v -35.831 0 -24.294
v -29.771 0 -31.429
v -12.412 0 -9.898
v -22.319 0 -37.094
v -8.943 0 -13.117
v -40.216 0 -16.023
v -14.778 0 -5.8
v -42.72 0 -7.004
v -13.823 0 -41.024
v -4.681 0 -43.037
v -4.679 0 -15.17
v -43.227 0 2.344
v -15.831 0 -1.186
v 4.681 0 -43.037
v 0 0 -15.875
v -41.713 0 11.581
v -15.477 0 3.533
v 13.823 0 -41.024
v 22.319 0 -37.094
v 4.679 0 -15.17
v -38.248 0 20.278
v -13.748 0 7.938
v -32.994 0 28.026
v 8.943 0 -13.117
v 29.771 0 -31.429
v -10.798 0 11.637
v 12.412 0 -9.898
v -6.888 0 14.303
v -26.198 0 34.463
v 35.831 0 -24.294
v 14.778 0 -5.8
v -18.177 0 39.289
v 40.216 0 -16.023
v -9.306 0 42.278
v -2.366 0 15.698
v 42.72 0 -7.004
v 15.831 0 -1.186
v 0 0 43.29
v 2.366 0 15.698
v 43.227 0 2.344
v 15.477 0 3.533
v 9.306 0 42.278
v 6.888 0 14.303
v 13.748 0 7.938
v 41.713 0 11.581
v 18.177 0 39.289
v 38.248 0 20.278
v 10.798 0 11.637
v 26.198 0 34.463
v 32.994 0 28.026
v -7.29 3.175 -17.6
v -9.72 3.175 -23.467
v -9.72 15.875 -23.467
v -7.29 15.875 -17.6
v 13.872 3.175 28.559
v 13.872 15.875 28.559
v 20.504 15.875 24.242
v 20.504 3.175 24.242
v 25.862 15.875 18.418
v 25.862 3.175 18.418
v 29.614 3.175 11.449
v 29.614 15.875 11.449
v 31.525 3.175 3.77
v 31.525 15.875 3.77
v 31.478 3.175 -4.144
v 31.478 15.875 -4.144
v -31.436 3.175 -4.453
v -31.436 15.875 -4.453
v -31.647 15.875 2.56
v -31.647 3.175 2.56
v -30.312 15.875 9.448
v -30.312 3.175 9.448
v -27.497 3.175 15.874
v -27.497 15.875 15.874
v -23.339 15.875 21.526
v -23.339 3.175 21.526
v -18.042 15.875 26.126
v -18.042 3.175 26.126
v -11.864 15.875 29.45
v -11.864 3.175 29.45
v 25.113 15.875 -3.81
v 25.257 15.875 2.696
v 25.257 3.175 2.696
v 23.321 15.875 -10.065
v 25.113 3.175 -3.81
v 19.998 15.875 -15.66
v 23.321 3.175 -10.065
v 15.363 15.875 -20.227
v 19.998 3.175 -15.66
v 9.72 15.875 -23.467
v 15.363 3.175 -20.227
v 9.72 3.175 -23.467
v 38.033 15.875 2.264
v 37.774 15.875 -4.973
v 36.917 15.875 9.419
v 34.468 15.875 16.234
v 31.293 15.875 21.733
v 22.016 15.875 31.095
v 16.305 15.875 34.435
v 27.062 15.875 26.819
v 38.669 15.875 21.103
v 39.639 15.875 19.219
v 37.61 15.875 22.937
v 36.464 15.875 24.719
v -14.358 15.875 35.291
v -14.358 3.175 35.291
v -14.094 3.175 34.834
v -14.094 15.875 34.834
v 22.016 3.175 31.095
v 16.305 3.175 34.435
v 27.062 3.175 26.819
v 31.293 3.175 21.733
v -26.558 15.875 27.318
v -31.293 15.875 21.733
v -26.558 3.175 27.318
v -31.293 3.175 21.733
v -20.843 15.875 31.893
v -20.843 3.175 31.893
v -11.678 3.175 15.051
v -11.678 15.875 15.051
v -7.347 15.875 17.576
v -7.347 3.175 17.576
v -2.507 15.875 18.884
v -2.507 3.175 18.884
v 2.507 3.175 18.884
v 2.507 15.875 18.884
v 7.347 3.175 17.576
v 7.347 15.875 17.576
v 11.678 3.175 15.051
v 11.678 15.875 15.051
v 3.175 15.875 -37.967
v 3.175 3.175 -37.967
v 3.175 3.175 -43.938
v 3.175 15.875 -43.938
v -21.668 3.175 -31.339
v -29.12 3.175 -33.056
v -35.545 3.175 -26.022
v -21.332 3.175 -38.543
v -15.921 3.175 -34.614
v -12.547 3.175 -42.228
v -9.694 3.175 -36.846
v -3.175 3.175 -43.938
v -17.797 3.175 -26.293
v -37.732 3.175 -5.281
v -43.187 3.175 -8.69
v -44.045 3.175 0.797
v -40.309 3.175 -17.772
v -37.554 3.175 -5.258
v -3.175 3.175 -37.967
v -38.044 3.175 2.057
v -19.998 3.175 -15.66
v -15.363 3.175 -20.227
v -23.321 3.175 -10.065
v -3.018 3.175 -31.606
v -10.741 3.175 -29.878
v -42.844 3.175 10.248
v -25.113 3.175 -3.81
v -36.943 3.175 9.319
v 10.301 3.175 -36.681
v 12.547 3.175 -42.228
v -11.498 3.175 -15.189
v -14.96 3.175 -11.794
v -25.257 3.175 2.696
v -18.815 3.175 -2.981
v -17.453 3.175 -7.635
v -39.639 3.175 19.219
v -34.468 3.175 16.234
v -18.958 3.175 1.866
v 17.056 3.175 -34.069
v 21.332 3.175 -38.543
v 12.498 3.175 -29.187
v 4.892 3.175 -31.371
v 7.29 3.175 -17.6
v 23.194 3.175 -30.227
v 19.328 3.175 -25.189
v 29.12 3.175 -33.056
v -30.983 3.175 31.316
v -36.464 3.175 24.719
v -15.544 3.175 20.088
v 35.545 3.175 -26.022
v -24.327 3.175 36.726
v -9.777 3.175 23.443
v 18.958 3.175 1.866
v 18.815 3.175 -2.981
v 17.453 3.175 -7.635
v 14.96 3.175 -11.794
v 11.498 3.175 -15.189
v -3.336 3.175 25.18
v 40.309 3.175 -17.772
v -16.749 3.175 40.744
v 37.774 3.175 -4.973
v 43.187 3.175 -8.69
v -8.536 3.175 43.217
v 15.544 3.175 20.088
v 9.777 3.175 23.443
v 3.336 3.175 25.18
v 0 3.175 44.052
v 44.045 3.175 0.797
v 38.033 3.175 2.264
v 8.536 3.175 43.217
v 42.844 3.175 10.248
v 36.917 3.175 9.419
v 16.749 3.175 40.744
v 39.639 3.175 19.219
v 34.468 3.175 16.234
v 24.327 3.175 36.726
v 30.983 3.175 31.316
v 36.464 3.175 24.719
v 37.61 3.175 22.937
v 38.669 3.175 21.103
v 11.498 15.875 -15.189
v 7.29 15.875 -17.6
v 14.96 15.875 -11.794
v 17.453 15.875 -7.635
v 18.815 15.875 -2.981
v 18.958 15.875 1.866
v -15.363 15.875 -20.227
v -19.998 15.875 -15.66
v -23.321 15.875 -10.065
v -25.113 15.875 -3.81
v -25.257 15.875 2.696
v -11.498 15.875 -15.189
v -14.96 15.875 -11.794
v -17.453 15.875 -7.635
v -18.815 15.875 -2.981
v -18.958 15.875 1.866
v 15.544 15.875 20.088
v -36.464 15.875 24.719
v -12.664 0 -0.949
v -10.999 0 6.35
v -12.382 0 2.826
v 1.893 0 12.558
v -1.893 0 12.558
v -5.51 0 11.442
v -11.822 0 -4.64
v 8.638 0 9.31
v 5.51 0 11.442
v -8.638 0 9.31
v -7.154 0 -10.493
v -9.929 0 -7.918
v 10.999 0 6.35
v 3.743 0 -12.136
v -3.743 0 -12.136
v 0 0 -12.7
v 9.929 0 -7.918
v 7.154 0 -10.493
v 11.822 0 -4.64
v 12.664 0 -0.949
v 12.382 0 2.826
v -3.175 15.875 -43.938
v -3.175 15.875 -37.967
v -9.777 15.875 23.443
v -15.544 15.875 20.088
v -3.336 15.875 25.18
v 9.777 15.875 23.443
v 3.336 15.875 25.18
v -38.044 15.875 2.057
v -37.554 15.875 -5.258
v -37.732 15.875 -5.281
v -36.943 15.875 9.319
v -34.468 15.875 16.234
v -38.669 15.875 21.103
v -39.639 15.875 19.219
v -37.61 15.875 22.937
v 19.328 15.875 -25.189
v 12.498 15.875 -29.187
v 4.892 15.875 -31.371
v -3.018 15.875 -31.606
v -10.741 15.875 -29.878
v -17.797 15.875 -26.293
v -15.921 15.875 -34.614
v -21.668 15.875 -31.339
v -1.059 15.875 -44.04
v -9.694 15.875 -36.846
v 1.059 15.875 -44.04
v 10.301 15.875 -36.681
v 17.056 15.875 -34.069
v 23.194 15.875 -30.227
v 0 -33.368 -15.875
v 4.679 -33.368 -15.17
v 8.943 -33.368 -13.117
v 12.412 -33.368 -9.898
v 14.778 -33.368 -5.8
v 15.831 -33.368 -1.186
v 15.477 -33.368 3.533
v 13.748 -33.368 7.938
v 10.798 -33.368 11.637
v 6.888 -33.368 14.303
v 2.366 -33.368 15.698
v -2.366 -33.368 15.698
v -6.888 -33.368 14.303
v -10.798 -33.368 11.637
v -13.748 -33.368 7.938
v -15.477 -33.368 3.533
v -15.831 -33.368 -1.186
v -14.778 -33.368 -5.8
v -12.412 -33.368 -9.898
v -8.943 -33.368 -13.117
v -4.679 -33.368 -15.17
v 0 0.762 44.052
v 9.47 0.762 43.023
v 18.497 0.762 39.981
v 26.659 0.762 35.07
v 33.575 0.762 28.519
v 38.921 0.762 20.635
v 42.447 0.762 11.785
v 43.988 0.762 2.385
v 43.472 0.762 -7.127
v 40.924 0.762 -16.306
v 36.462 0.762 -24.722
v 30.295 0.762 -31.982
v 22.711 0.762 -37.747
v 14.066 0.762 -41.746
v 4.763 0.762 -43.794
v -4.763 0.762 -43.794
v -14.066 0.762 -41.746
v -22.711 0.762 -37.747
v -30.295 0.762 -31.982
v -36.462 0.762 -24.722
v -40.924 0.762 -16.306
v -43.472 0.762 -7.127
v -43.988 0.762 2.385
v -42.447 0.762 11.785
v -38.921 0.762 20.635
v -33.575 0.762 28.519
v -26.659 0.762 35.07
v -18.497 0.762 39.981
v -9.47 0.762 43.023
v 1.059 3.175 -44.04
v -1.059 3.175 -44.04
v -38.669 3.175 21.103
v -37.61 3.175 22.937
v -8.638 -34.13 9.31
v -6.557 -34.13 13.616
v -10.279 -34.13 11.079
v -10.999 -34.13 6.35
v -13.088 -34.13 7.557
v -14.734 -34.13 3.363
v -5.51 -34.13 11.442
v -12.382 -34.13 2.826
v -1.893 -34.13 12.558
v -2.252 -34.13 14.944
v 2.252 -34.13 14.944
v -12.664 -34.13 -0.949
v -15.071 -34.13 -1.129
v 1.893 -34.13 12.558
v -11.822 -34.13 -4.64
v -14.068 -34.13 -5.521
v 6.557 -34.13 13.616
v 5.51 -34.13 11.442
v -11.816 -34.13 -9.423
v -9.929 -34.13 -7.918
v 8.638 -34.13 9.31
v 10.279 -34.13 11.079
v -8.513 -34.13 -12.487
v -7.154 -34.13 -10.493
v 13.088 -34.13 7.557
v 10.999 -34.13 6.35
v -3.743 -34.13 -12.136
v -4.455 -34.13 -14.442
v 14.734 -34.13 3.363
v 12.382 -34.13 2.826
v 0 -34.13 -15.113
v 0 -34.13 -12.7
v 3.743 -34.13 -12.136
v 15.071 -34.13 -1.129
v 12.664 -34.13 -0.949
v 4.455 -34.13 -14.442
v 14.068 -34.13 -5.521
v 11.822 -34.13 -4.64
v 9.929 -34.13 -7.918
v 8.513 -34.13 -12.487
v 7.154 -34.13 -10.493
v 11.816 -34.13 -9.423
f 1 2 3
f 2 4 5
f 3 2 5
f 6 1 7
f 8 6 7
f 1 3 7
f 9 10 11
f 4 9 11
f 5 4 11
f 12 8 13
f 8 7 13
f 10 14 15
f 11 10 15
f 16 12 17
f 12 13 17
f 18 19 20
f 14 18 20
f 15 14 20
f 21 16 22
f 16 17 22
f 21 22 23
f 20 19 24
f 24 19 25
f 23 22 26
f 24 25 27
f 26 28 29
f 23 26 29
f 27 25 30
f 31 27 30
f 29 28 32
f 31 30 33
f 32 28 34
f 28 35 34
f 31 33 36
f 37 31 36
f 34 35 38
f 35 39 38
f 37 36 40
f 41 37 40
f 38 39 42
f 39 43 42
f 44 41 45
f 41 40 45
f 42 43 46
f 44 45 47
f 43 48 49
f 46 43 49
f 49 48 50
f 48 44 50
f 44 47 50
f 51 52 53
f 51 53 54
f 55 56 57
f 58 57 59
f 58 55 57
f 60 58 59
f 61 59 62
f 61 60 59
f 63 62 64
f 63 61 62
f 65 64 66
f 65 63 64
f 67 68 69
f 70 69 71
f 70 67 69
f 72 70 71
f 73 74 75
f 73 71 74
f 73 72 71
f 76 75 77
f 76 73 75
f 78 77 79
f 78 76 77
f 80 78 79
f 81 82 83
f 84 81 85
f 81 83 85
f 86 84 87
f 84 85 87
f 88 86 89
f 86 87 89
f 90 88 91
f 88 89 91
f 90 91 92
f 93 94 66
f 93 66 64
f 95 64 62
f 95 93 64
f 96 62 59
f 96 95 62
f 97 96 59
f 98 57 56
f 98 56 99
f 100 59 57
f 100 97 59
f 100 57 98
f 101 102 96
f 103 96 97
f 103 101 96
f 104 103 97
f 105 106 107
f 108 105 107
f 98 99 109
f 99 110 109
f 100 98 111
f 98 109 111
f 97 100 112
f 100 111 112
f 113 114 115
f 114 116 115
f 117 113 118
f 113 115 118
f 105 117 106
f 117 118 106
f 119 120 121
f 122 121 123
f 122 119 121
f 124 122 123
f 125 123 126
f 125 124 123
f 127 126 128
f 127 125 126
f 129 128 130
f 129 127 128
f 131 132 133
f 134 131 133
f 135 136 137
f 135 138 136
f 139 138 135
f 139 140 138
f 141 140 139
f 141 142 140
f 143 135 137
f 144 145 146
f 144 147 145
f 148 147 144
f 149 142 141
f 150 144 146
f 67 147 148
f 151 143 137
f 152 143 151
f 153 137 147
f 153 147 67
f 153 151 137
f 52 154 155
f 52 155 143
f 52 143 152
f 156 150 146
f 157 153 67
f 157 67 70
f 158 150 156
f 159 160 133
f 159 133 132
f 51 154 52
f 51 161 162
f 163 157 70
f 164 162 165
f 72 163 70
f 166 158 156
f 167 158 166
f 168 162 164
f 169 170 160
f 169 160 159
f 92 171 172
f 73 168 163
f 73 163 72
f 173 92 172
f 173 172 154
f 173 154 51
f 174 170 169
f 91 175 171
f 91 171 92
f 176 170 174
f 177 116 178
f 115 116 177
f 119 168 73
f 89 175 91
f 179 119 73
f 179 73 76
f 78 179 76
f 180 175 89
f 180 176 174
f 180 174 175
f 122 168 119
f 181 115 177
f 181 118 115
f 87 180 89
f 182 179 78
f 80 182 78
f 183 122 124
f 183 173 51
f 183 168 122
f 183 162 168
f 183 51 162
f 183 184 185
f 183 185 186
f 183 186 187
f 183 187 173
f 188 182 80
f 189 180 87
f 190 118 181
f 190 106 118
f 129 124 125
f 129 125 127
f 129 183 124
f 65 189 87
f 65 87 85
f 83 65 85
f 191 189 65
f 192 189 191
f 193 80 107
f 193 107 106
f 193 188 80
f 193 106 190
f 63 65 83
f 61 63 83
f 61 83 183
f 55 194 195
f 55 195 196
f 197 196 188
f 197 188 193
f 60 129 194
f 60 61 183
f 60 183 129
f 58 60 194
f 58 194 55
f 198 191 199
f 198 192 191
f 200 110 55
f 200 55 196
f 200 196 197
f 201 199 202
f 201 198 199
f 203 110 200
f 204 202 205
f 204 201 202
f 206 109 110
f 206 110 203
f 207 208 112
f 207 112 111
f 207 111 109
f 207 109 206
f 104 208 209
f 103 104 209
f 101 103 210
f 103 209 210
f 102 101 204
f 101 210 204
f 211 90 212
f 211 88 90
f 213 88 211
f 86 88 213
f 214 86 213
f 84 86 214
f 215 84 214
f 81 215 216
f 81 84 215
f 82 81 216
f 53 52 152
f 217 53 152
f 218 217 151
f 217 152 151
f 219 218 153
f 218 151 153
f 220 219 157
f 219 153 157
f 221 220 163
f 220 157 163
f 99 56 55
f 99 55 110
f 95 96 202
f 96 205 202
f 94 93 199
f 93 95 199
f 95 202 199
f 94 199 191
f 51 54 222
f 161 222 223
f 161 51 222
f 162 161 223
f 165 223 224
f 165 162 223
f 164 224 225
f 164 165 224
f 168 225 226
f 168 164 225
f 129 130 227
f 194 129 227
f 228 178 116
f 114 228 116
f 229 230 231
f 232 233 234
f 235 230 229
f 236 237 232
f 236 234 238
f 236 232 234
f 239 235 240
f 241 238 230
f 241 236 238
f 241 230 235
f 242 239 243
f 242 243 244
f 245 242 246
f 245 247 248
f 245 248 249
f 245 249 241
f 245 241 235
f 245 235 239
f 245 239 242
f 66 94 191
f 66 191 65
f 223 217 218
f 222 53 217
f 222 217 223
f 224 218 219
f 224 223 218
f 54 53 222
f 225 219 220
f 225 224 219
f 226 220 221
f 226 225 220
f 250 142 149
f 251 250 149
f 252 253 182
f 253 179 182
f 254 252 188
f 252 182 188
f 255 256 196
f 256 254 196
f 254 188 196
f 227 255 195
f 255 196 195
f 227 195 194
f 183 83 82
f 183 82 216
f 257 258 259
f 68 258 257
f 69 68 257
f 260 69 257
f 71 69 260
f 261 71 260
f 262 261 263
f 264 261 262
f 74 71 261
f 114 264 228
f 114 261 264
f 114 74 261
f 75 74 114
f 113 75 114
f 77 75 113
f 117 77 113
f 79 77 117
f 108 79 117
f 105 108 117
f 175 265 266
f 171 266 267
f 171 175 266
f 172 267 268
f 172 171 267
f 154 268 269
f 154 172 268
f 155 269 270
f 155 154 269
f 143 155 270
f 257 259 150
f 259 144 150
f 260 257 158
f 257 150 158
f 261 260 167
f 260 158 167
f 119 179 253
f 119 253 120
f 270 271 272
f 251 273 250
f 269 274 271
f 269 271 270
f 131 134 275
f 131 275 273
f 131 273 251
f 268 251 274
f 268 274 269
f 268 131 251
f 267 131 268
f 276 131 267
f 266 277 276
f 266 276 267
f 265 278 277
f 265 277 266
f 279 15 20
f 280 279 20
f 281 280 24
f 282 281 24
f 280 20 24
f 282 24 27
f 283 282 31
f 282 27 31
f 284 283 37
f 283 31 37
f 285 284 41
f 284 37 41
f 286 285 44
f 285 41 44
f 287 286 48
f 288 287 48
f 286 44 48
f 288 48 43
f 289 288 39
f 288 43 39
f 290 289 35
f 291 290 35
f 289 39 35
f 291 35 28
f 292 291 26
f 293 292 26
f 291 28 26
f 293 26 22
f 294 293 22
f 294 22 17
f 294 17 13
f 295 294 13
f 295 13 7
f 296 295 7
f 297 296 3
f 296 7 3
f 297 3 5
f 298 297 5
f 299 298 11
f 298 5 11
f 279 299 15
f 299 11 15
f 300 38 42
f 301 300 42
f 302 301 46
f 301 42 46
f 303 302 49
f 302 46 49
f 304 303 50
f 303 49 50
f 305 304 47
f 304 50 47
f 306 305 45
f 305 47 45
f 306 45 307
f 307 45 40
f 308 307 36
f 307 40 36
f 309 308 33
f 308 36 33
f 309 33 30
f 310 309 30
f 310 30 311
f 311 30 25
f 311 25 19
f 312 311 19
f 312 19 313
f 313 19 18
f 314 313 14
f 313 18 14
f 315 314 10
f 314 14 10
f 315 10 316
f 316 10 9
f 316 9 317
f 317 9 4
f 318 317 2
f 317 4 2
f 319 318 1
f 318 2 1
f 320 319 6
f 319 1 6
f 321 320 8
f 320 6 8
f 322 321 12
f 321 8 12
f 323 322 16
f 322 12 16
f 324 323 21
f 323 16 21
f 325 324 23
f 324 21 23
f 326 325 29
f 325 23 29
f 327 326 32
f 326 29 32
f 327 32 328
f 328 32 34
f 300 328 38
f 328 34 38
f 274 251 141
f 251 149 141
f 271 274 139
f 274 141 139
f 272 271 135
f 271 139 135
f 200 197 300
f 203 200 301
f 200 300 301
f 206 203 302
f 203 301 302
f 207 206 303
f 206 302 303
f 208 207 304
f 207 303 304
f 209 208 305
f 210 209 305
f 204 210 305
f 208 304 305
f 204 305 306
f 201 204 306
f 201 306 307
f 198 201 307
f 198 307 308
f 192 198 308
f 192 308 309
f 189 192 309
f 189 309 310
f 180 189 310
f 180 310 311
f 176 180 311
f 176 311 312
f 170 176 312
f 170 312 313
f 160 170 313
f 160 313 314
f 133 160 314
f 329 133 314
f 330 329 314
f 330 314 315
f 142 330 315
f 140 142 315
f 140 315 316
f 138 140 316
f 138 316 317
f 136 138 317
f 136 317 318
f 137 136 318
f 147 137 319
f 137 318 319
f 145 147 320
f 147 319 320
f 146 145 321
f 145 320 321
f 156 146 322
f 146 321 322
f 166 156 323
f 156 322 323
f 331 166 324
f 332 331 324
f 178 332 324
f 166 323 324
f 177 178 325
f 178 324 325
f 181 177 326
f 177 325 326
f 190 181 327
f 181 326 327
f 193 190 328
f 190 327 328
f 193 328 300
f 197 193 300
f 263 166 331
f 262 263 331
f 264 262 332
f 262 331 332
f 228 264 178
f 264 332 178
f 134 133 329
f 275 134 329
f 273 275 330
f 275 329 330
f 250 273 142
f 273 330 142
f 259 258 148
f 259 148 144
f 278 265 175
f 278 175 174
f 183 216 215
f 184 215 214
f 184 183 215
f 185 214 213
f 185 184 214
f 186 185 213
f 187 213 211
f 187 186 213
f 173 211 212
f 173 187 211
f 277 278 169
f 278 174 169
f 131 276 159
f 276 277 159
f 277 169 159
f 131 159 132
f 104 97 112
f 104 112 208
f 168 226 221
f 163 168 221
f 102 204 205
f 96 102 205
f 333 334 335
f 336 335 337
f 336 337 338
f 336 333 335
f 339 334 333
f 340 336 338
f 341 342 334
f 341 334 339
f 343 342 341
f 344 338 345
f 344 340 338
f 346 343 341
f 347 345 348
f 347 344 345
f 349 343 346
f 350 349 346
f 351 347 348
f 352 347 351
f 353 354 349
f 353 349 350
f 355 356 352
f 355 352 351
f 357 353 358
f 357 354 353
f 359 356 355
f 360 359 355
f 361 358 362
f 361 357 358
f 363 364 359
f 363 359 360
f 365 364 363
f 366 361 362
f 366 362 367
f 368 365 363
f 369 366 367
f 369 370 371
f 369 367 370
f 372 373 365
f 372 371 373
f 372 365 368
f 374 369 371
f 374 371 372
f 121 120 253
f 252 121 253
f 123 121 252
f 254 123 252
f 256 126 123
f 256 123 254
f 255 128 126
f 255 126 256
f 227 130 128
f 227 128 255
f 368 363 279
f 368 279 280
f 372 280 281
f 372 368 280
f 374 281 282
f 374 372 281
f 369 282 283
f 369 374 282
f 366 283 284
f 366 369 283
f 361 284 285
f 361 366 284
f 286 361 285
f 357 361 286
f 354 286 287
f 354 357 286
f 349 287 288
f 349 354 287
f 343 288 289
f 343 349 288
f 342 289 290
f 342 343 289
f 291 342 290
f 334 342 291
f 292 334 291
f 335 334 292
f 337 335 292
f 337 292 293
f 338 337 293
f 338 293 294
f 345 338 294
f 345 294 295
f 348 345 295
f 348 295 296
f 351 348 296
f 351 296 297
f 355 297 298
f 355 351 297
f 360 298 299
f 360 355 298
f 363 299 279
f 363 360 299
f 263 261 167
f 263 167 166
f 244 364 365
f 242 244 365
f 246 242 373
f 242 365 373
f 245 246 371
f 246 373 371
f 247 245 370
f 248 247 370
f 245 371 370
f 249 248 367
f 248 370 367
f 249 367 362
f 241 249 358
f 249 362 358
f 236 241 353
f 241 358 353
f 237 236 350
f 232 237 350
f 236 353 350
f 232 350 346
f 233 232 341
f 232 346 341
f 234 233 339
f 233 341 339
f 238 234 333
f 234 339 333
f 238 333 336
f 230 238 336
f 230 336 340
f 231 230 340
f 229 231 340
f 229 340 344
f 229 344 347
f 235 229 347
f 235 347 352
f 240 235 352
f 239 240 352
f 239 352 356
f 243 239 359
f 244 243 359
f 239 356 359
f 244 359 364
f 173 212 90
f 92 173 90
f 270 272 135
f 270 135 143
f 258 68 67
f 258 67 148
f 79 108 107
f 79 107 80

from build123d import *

# Parameters (mm, degrees)
SKETCH1_R           = 44.05249
BOSS_EXTRUDE1_DEPTH = 3.175
SKETCH2_R           = 15.875
BOSS_EXTRUDE2_DEPTH = 34.12998
SKETCH3_R           = 25.4
SKETCH3_R_2         = 19.05
BOSS_EXTRUDE3_DEPTH = 12.7
CUT_EXTRUDE2_DEPTH  = 73.614773175
CIRPATTERN1_COUNT   = 3
SKETCH5_R           = 38.1
SKETCH5_R_2         = 31.75
BOSS_EXTRUDE5_DEPTH = 12.7
CUT_EXTRUDE4_DEPTH  = 12.7
CIRPATTERN3_COUNT   = 3
BOSS_EXTRUDE6_DEPTH = 12.7
CIRPATTERN4_COUNT   = 3
SKETCH8_R           = 12.7
CUT_EXTRUDE5_DEPTH  = 34.12998
CHAMFER1_SIZE       = 0.762


with BuildPart() as part:
    # Sketch1 → Boss-Extrude1 (new body)
    with BuildSketch(Plane(origin=(0, 0, 0), x_dir=(1, 0, 0), z_dir=(0, 1, 0))):
        with Locations(Location((0, 0, 0), (0, 0, 270))):
            Circle(SKETCH1_R)
    extrude(amount=BOSS_EXTRUDE1_DEPTH)

    # Sketch2 → Boss-Extrude2 (add)
    with BuildSketch(Plane.XZ):
        with Locations(Location((0, 0, 0), (0, 0, 270))):
            Circle(SKETCH2_R)
    extrude(amount=BOSS_EXTRUDE2_DEPTH)

    # Sketch3 → Boss-Extrude3 (add)
    with BuildSketch(Plane(origin=(0, 3.175, 0), x_dir=(1, 0, 0), z_dir=(0, 1, 0))):
        with Locations(Location((0, 0, 0), (0, 0, 270))):
            Circle(SKETCH3_R)
        with Locations(Location((0, 0, 0), (0, 0, 270))):
            Circle(SKETCH3_R_2, mode=Mode.SUBTRACT)
    extrude(amount=BOSS_EXTRUDE3_DEPTH)

    # Sketch4 → Cut-Extrude2 (cut, through all)
    with BuildSketch(Plane(origin=(0, 3.175, 0), x_dir=(1, 0, 0), z_dir=(0, 1, 0))):
        Polygon((0, 0), (11.462134213, 27.672039871), (-12.066850466, 29.13195405), align=None)
    cut_extrude2 = extrude(amount=CUT_EXTRUDE2_DEPTH, mode=Mode.SUBTRACT)

    # CirPattern1: Cut-Extrude2 ×3 about axis
    cirpattern1_axis = Axis((0, 0, -0.454253878), (0, 1, 0))
    for i in range(1, CIRPATTERN1_COUNT):
        add(cut_extrude2.rotate(cirpattern1_axis, i * 360 / CIRPATTERN1_COUNT), mode=Mode.SUBTRACT)

    # Sketch5 → Boss-Extrude5 (add)
    with BuildSketch(Plane(origin=(0, 3.175, 0), x_dir=(1, 0, 0), z_dir=(0, 1, 0))):
        with Locations(Location((0, 0, 0), (0, 0, 270))):
            Circle(SKETCH5_R)
        with Locations(Location((0, 0, 0), (0, 0, 270))):
            Circle(SKETCH5_R_2, mode=Mode.SUBTRACT)
    extrude(amount=BOSS_EXTRUDE5_DEPTH)

    # Sketch6 → Cut-Extrude4 (cut)
    with BuildSketch(Plane(origin=(0, 15.875, 0), x_dir=(1, 0, 0), z_dir=(0, 1, 0))):
        Polygon((24.518856113, 31.953595399), (30.847960217, 40.201844455), (52.890000535, 5.212460302), (39.592566776, 5.212460302), (30.847960217, 4.061211008), (18.173239697, 23.68382708), align=None)
    cut_extrude4 = extrude(amount=-CUT_EXTRUDE4_DEPTH, mode=Mode.SUBTRACT)

    # CirPattern3: Cut-Extrude4 ×3 about axis
    cirpattern3_axis = Axis((1.188980204, 0, -0.687015275), (0, 1, 0))
    for i in range(1, CIRPATTERN3_COUNT):
        add(cut_extrude4.rotate(cirpattern3_axis, i * 360 / CIRPATTERN3_COUNT), mode=Mode.SUBTRACT)

    # Sketch7 → Boss-Extrude6 (add)
    with BuildSketch(Plane(origin=(0, 3.175, 0), x_dir=(1, 0, 0), z_dir=(0, 1, 0))):
        with BuildLine():
            Line((3.175, 35.86061982), (3.175, 43.937924965))
            ThreePointArc((3.175, 43.937924965), (0, 44.05249), (-3.175, 43.937924965))
            Line((-3.175, 43.937924965), (-3.175, 35.86061982))
            ThreePointArc((-3.175, 35.86061982), (0, 36.000898307), (3.175, 35.86061982))
        make_face()
    boss_extrude6 = extrude(amount=BOSS_EXTRUDE6_DEPTH)

    # CirPattern4: Boss-Extrude6 ×3 about axis
    cirpattern4_axis = Axis((0, 0, 0), (0, 1, 0))
    for i in range(1, CIRPATTERN4_COUNT):
        add(boss_extrude6.rotate(cirpattern4_axis, i * 360 / CIRPATTERN4_COUNT))

    # Sketch8 → Cut-Extrude5 (cut)
    with BuildSketch(Plane.XZ.offset(34.12998)):
        with Locations(Location((0, 0, 0), (0, 0, 270))):
            Circle(SKETCH8_R)
    extrude(amount=-CUT_EXTRUDE5_DEPTH, mode=Mode.SUBTRACT)

    # Chamfer1
    chamfer1_edges = [part.edges().sort_by_distance(p)[0] for p in [
        (0, 0, -44.05249),
        (0, -34.12998, 15.875),
    ]]
    chamfer(chamfer1_edges, length=CHAMFER1_SIZE)


solid = part.part
